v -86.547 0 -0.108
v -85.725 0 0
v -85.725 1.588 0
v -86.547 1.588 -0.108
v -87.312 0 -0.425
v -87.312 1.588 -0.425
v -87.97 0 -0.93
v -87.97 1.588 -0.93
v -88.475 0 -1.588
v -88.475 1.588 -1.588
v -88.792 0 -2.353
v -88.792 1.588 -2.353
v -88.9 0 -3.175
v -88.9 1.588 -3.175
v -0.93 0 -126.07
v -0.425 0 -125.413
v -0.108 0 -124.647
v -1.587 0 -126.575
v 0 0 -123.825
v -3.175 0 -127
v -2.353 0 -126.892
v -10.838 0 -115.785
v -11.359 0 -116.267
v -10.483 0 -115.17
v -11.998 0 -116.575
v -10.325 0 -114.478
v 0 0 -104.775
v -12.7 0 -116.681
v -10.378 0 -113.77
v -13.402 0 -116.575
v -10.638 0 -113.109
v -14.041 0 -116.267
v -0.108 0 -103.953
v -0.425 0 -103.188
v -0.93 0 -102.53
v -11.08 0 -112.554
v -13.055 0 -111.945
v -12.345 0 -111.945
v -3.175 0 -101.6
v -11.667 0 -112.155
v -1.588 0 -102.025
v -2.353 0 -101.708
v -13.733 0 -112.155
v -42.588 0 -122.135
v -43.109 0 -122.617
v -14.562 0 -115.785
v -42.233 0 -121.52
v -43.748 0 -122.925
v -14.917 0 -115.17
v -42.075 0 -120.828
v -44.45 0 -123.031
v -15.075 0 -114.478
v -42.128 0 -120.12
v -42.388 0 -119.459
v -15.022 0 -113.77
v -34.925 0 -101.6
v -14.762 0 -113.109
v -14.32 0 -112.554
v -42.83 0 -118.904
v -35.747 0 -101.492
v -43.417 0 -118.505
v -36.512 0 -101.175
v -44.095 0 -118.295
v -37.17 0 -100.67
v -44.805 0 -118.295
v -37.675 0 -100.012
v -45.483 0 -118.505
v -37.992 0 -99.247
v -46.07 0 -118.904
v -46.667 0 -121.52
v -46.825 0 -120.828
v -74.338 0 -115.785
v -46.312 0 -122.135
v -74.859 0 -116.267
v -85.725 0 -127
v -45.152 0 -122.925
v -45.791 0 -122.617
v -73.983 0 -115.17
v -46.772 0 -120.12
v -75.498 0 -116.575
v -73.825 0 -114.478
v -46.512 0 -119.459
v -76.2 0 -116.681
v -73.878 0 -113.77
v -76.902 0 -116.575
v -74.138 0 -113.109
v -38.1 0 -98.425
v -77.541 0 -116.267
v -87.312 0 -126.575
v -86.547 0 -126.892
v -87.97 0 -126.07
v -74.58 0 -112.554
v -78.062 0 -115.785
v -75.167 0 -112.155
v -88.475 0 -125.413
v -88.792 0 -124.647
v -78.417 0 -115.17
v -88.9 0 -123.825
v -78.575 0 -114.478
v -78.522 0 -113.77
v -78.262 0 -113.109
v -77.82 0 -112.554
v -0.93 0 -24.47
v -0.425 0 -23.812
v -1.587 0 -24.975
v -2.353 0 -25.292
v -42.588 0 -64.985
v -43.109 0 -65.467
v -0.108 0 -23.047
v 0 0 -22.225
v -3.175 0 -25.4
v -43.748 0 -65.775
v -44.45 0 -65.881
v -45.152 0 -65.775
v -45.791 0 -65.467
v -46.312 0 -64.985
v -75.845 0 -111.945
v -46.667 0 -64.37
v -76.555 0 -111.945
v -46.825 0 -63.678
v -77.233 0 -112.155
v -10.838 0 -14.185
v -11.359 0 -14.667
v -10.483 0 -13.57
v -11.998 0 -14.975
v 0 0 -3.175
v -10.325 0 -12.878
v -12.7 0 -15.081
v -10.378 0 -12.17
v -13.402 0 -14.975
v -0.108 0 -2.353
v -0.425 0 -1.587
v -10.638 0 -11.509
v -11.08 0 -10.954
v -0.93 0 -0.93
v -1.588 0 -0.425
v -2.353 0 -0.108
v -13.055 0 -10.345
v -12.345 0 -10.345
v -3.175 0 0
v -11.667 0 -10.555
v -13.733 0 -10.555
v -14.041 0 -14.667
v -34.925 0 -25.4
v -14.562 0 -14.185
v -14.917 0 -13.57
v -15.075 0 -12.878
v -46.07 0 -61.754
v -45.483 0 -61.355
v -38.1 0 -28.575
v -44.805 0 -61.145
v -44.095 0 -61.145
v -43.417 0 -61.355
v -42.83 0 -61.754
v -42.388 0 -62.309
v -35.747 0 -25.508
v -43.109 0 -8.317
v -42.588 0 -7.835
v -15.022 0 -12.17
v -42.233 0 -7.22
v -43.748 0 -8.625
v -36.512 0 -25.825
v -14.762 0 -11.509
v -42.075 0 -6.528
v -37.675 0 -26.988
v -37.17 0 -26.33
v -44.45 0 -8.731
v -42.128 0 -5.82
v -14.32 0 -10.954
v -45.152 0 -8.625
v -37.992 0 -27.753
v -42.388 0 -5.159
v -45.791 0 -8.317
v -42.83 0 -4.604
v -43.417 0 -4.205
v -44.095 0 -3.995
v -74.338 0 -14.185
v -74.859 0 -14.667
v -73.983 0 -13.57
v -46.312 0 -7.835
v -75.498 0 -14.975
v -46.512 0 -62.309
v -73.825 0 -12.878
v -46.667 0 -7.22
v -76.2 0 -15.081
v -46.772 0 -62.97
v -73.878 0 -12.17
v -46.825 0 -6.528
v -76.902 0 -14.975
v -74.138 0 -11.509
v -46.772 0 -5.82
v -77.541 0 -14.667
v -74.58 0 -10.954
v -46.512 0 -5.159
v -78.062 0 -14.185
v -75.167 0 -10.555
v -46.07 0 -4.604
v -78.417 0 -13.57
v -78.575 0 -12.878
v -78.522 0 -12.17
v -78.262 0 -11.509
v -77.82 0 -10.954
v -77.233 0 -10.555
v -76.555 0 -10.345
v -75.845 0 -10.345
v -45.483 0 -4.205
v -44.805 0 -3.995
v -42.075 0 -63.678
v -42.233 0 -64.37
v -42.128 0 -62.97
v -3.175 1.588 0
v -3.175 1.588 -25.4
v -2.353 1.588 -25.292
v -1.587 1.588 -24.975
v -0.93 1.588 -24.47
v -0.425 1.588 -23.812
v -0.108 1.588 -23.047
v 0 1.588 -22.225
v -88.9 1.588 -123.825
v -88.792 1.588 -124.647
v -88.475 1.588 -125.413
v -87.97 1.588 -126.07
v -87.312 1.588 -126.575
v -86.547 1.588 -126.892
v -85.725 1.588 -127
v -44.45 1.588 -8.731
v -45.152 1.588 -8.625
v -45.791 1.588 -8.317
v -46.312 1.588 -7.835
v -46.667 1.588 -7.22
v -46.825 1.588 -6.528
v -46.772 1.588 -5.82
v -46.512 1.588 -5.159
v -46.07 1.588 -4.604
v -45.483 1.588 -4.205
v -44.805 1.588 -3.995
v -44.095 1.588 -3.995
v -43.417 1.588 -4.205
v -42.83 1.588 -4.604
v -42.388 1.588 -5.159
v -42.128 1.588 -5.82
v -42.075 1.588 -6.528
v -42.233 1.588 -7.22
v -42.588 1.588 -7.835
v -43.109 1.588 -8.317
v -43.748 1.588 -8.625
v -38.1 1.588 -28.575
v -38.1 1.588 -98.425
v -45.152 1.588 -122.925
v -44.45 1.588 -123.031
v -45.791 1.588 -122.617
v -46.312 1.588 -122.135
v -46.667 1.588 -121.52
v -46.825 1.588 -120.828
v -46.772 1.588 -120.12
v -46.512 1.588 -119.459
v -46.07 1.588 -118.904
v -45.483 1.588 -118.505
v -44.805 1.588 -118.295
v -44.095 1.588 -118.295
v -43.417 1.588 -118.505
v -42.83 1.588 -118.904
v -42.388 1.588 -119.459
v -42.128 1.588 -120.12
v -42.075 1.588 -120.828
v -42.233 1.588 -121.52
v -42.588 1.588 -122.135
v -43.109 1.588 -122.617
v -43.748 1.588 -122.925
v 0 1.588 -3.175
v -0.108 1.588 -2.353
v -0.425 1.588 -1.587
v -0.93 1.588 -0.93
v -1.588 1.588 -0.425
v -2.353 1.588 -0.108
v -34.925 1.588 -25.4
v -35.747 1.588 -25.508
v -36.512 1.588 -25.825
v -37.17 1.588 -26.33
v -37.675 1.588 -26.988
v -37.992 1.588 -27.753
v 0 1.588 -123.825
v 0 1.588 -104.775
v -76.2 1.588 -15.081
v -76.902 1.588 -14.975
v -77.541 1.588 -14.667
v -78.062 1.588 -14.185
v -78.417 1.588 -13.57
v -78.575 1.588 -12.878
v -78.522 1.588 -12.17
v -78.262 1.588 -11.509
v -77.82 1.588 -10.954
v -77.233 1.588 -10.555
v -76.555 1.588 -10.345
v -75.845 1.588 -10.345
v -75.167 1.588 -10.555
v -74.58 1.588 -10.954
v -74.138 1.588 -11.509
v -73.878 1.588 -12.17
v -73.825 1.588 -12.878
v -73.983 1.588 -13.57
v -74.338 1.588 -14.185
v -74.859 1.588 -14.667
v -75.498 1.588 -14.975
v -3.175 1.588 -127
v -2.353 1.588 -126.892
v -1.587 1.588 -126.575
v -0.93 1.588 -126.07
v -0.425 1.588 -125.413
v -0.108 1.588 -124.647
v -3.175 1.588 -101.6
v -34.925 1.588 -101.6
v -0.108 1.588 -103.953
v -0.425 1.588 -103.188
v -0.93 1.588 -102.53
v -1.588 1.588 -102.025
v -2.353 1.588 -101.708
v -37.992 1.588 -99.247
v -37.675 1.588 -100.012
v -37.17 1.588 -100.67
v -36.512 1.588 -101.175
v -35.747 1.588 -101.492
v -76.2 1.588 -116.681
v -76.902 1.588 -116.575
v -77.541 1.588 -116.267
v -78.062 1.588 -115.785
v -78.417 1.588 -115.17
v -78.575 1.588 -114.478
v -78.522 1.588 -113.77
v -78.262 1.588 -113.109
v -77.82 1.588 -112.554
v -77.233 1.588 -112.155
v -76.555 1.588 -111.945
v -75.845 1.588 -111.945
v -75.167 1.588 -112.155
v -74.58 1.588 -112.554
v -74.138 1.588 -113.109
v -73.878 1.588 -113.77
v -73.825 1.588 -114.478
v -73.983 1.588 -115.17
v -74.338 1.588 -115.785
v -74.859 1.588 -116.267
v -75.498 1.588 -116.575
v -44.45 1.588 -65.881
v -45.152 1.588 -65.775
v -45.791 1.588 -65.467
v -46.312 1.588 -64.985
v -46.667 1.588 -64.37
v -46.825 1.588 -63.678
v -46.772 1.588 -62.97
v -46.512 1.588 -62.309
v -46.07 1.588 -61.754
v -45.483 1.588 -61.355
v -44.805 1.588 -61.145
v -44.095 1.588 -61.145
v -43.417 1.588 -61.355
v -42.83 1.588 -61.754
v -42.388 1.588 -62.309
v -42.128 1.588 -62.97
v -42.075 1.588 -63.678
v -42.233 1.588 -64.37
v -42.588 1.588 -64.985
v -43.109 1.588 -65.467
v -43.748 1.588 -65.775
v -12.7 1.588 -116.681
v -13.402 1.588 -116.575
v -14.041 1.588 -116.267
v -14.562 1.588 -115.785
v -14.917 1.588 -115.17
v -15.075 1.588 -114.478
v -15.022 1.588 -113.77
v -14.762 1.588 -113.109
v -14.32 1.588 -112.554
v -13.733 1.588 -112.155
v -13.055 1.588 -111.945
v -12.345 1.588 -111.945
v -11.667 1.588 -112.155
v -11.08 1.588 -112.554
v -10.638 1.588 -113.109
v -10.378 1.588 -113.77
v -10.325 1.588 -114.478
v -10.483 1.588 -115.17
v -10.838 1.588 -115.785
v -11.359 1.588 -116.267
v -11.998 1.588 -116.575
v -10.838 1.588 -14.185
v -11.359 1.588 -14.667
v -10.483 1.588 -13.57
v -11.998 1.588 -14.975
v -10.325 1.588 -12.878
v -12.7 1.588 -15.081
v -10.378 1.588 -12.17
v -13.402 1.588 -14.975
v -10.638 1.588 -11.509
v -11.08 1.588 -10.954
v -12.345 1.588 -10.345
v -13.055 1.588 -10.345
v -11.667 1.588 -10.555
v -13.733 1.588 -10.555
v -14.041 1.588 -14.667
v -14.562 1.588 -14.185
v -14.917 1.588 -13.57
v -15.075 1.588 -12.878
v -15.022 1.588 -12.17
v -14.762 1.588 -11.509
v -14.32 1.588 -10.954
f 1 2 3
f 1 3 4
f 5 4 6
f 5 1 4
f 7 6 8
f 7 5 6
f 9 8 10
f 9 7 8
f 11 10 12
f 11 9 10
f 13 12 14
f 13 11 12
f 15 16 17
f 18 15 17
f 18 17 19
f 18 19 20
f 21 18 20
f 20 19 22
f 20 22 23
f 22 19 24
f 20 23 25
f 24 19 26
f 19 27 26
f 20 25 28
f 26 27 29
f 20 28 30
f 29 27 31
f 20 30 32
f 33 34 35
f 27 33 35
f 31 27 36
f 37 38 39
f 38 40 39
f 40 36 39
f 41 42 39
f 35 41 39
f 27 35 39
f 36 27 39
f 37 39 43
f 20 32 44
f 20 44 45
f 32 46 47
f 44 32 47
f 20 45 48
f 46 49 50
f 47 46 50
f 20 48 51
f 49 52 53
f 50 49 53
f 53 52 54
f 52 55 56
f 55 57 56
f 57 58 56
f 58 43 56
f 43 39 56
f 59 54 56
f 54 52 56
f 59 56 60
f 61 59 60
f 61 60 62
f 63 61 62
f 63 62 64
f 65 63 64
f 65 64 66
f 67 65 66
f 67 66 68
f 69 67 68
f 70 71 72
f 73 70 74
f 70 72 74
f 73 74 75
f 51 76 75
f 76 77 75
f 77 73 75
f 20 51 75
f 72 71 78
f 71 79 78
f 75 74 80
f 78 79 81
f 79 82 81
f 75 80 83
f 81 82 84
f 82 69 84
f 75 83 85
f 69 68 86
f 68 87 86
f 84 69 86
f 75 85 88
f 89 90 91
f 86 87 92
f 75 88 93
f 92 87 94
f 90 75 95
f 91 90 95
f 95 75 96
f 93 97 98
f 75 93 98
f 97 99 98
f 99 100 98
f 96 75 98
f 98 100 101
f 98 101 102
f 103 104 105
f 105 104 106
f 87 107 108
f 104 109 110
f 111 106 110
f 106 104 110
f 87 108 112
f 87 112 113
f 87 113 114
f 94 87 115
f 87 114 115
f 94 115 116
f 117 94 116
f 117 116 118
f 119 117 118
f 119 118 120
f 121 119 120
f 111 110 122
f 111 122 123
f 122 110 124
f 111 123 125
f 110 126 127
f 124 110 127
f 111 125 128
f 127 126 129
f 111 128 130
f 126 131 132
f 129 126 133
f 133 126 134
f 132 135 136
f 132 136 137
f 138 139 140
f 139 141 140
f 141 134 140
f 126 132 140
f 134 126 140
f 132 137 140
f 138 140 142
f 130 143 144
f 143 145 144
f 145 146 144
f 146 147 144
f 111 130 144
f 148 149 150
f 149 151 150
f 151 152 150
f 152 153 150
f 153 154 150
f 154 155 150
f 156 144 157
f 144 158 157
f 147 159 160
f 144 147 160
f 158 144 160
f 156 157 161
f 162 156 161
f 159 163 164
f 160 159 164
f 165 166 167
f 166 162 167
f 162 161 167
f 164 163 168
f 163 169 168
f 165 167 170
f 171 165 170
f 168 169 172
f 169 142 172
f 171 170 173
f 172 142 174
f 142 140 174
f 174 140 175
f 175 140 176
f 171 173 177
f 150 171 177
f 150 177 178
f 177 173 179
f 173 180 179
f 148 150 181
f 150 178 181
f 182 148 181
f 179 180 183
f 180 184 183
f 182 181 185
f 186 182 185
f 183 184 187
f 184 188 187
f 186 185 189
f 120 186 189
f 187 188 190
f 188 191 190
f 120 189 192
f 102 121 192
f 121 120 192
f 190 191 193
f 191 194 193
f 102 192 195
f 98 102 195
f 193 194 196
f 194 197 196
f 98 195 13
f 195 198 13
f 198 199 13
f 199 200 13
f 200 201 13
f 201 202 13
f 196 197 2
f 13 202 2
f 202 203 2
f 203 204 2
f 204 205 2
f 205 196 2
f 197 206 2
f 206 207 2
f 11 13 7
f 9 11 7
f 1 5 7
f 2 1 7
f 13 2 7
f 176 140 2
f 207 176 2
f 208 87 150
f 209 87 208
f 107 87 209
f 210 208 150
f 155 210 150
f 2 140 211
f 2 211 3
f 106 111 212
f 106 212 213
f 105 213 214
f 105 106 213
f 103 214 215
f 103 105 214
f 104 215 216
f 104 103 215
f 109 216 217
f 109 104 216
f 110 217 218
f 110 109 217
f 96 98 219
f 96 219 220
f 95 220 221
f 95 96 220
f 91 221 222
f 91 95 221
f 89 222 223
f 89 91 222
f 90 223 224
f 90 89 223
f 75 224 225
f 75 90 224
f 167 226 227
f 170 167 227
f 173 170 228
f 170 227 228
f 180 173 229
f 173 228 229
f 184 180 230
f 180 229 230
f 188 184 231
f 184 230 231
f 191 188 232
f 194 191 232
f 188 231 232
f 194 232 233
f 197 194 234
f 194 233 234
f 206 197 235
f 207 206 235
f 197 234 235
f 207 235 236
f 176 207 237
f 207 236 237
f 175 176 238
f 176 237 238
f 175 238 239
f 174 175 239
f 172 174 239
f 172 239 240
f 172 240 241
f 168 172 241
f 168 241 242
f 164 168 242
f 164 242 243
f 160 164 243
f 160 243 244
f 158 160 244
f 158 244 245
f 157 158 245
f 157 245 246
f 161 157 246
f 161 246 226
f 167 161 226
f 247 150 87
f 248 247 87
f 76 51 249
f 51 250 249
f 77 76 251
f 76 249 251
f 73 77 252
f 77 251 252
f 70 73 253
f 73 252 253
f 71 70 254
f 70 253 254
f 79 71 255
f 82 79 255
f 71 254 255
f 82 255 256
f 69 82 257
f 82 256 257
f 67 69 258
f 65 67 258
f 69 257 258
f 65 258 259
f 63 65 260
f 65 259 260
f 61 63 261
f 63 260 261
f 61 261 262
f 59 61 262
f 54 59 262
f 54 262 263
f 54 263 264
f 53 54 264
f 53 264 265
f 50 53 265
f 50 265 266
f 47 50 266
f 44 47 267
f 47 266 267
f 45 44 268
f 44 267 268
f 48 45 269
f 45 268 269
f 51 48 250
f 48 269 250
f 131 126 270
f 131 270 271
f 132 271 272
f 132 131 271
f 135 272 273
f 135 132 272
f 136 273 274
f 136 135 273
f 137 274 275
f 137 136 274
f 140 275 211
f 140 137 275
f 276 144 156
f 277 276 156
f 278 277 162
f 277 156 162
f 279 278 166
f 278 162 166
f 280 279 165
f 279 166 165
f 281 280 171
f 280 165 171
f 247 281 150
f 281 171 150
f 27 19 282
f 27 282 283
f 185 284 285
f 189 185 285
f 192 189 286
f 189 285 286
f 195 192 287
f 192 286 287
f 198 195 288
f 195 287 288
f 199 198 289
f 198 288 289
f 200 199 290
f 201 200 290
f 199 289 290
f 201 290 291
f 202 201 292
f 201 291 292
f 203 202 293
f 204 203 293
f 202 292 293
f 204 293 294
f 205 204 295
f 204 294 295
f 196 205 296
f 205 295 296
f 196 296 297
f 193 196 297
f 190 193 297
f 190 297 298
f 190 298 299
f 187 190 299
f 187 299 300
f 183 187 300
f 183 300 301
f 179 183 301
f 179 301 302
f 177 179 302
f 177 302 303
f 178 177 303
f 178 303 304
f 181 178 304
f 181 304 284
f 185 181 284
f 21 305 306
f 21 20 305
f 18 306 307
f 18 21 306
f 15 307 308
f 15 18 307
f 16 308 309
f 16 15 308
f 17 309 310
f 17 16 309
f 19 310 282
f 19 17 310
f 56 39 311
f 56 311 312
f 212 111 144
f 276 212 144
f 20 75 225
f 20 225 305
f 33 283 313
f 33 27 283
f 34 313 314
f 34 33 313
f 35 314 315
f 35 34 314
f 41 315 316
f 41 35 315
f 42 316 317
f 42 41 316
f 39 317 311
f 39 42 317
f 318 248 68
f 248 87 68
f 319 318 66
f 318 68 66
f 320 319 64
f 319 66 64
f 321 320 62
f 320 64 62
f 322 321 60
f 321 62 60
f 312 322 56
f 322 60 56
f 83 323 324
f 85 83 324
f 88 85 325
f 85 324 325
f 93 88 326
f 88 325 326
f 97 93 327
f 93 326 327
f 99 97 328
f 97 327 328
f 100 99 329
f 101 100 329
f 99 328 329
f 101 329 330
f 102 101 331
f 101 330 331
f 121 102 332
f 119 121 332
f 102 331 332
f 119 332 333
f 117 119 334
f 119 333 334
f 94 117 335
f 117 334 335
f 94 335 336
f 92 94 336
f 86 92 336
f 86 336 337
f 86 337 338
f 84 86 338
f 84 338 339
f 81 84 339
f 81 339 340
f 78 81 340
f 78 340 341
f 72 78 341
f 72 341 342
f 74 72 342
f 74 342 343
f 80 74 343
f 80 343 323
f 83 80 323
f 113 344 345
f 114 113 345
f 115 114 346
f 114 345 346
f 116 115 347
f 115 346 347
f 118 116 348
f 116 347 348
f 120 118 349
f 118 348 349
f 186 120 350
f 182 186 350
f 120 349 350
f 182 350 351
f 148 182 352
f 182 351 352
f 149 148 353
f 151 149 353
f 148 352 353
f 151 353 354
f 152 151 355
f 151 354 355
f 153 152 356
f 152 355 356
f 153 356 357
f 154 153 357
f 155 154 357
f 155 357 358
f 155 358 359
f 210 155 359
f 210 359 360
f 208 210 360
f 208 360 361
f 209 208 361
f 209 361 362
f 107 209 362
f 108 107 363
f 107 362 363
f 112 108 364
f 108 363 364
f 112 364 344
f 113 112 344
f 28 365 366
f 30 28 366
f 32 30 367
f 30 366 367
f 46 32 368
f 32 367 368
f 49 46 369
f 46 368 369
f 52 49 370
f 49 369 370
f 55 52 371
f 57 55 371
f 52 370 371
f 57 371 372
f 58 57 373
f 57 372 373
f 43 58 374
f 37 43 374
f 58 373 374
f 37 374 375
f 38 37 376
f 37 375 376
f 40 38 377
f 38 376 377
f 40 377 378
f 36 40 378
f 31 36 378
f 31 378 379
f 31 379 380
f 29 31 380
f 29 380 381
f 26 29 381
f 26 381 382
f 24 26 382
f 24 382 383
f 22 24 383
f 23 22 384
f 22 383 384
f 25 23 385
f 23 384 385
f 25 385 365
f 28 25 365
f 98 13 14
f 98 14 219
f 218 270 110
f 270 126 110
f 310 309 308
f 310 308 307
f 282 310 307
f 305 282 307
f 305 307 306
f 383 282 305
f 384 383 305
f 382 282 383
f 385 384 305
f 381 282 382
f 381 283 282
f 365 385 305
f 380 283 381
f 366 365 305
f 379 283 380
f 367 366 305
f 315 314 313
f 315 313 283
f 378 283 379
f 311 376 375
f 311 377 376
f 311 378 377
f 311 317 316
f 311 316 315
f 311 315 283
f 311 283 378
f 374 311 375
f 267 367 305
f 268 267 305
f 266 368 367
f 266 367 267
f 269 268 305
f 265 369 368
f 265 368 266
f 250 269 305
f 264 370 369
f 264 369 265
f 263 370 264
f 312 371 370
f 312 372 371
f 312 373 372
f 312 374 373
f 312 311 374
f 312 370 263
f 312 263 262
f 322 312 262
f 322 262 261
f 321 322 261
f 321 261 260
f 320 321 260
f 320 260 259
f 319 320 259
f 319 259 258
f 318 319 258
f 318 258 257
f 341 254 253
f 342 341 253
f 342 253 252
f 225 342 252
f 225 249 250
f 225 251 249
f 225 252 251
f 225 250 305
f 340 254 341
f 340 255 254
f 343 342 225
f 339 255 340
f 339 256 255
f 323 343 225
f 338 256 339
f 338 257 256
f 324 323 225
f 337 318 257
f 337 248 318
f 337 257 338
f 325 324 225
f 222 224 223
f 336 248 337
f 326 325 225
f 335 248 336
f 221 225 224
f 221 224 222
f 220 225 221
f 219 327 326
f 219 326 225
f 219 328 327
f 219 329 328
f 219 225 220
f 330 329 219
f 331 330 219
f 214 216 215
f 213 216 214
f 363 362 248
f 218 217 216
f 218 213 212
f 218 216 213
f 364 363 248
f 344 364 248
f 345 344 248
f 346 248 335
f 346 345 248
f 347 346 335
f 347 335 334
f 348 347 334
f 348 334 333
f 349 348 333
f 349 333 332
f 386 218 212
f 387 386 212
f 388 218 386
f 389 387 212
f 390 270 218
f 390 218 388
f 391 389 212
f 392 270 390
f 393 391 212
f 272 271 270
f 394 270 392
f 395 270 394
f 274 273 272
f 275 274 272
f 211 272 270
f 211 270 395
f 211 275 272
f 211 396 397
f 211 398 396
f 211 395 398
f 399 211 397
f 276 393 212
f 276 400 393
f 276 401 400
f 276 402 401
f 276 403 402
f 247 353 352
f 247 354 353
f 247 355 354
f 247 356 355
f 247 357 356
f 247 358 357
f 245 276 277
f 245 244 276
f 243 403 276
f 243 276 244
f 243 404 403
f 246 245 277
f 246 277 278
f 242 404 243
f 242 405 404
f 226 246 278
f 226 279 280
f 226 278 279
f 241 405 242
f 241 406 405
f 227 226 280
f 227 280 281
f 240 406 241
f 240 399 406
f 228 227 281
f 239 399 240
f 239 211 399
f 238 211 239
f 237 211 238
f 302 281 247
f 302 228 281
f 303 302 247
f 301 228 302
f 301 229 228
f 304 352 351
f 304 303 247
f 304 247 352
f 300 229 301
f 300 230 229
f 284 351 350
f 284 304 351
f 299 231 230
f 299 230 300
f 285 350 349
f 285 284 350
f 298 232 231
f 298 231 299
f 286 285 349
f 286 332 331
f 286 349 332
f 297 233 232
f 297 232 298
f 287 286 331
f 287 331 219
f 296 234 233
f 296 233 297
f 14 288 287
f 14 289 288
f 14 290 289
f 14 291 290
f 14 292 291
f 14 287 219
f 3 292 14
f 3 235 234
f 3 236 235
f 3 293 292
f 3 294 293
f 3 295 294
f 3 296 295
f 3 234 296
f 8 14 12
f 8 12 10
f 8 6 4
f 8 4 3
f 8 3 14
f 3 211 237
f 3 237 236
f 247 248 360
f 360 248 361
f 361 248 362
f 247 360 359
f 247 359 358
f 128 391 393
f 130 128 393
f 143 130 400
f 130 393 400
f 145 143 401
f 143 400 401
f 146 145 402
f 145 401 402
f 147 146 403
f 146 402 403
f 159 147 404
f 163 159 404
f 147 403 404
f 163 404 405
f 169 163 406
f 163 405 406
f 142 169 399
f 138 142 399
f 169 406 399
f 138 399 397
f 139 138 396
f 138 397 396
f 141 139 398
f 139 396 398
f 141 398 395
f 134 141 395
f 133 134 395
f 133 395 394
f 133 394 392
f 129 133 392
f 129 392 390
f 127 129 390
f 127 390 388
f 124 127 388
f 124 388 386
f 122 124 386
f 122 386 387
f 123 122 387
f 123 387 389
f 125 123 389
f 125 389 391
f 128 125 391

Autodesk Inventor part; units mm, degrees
ref_plane "YZ Plane" through (0, 0, 0) normal (1, 0, 0) x (0, 1, 0)
ref_plane "XZ Plane" through (0, 0, 0) normal (0, 1, 0) x (-1, 0, 0)
ref_plane "XY Plane" through (0, 0, 0) normal (0, 0, 1) x (1, 0, 0)
sketch "Sketch1" plane through (0, 0, 0) normal (0, 1, 0) x (-1, 0, 0)
  line L0 (3.175, 0) -> (85.725, 0)
  line L1 (88.9, -3.175) -> (88.9, -123.825)
  line L2 (85.725, -127) -> (3.175, -127)
  line L3 (0, -123.825) -> (0, -104.775)
  line L4 (3.175, -101.6) -> (34.925, -101.6)
  line L5 (0, -3.175) -> (0, -22.225)
  line L6 (3.175, -25.4) -> (34.925, -25.4)
  line L7 (38.1, -28.575) -> (38.1, -98.425)
  arc A0 (88.9, -3.175) -> (85.725, 0) centre (85.725, -3.175) ccw
  arc A1 (85.725, -127) -> (88.9, -123.825) centre (85.725, -123.825) ccw
  arc A2 (0, -123.825) -> (3.175, -127) centre (3.175, -123.825) ccw
  arc A3 (3.175, -101.6) -> (0, -104.775) centre (3.175, -104.775) ccw
  arc A4 (34.925, -101.6) -> (38.1, -98.425) centre (34.925, -98.425) ccw
  arc A5 (3.175, 0) -> (0, -3.175) centre (3.175, -3.175) ccw
  arc A6 (0, -22.225) -> (3.175, -25.4) centre (3.175, -22.225) ccw
  arc A7 (38.1, -28.575) -> (34.925, -25.4) centre (34.925, -28.575) ccw
  line L8 (0, 0) -> (0, -12.7)
  line L9 (0, 0) -> (0, -12.7)
  line L10 (0, -12.7) -> (12.7, -12.7)
  line L11 (12.7, -12.7) -> (76.2, -12.7)
  line L12 (0, -114.3) -> (12.7, -114.3)
  line L13 (12.7, -114.3) -> (76.2, -114.3)
  line L14 (76.2, -12.7) -> (44.45, -12.7)
  line L15 (44.45, -12.7) -> (44.45, -6.35)
  line L16 (76.2, -114.3) -> (44.45, -114.3)
  line L17 (44.45, -114.3) -> (44.45, -120.65)
  line L18 (44.45, -12.7) -> (44.45, -114.3)
  line L19 (44.45, -63.5) -> (52.1099, -63.5)
  point P0 (88.9, 0)
  point P1 (88.9, -127)
  point P2 (0, -127)
  point P3 (0, -101.6)
  point P4 (38.1, -101.6)
  point P5 (0, -25.4)
  dimension "d0" = 88.9
  dimension "d1" = 127
  dimension "d2" = 25.4
  dimension "d3" = 38.1
  dimension "d4" = 25.4
  dimension "d5" = 3.175
  dimension "d8" = 12.7
  dimension "d10" = 63.5
  dimension "d11" = 31.75
  dimension "d12" = 6.35
extrude "Extrusion1" add sketch "Sketch1" along normal blind 1.5875
hole "Hole1" at (-76.2, 0, -12.7) at (-44.45, 0, -6.35) at (-12.7, 0, -12.7) at (-12.7, 0, -114.3) at (-44.45, 0, -120.65) at (-76.2, 0, -114.3) at (-44.45, 0, -63.5) direction (0, 1, 0) diameter 4.7625 end through all
properties part number "triball holder"
